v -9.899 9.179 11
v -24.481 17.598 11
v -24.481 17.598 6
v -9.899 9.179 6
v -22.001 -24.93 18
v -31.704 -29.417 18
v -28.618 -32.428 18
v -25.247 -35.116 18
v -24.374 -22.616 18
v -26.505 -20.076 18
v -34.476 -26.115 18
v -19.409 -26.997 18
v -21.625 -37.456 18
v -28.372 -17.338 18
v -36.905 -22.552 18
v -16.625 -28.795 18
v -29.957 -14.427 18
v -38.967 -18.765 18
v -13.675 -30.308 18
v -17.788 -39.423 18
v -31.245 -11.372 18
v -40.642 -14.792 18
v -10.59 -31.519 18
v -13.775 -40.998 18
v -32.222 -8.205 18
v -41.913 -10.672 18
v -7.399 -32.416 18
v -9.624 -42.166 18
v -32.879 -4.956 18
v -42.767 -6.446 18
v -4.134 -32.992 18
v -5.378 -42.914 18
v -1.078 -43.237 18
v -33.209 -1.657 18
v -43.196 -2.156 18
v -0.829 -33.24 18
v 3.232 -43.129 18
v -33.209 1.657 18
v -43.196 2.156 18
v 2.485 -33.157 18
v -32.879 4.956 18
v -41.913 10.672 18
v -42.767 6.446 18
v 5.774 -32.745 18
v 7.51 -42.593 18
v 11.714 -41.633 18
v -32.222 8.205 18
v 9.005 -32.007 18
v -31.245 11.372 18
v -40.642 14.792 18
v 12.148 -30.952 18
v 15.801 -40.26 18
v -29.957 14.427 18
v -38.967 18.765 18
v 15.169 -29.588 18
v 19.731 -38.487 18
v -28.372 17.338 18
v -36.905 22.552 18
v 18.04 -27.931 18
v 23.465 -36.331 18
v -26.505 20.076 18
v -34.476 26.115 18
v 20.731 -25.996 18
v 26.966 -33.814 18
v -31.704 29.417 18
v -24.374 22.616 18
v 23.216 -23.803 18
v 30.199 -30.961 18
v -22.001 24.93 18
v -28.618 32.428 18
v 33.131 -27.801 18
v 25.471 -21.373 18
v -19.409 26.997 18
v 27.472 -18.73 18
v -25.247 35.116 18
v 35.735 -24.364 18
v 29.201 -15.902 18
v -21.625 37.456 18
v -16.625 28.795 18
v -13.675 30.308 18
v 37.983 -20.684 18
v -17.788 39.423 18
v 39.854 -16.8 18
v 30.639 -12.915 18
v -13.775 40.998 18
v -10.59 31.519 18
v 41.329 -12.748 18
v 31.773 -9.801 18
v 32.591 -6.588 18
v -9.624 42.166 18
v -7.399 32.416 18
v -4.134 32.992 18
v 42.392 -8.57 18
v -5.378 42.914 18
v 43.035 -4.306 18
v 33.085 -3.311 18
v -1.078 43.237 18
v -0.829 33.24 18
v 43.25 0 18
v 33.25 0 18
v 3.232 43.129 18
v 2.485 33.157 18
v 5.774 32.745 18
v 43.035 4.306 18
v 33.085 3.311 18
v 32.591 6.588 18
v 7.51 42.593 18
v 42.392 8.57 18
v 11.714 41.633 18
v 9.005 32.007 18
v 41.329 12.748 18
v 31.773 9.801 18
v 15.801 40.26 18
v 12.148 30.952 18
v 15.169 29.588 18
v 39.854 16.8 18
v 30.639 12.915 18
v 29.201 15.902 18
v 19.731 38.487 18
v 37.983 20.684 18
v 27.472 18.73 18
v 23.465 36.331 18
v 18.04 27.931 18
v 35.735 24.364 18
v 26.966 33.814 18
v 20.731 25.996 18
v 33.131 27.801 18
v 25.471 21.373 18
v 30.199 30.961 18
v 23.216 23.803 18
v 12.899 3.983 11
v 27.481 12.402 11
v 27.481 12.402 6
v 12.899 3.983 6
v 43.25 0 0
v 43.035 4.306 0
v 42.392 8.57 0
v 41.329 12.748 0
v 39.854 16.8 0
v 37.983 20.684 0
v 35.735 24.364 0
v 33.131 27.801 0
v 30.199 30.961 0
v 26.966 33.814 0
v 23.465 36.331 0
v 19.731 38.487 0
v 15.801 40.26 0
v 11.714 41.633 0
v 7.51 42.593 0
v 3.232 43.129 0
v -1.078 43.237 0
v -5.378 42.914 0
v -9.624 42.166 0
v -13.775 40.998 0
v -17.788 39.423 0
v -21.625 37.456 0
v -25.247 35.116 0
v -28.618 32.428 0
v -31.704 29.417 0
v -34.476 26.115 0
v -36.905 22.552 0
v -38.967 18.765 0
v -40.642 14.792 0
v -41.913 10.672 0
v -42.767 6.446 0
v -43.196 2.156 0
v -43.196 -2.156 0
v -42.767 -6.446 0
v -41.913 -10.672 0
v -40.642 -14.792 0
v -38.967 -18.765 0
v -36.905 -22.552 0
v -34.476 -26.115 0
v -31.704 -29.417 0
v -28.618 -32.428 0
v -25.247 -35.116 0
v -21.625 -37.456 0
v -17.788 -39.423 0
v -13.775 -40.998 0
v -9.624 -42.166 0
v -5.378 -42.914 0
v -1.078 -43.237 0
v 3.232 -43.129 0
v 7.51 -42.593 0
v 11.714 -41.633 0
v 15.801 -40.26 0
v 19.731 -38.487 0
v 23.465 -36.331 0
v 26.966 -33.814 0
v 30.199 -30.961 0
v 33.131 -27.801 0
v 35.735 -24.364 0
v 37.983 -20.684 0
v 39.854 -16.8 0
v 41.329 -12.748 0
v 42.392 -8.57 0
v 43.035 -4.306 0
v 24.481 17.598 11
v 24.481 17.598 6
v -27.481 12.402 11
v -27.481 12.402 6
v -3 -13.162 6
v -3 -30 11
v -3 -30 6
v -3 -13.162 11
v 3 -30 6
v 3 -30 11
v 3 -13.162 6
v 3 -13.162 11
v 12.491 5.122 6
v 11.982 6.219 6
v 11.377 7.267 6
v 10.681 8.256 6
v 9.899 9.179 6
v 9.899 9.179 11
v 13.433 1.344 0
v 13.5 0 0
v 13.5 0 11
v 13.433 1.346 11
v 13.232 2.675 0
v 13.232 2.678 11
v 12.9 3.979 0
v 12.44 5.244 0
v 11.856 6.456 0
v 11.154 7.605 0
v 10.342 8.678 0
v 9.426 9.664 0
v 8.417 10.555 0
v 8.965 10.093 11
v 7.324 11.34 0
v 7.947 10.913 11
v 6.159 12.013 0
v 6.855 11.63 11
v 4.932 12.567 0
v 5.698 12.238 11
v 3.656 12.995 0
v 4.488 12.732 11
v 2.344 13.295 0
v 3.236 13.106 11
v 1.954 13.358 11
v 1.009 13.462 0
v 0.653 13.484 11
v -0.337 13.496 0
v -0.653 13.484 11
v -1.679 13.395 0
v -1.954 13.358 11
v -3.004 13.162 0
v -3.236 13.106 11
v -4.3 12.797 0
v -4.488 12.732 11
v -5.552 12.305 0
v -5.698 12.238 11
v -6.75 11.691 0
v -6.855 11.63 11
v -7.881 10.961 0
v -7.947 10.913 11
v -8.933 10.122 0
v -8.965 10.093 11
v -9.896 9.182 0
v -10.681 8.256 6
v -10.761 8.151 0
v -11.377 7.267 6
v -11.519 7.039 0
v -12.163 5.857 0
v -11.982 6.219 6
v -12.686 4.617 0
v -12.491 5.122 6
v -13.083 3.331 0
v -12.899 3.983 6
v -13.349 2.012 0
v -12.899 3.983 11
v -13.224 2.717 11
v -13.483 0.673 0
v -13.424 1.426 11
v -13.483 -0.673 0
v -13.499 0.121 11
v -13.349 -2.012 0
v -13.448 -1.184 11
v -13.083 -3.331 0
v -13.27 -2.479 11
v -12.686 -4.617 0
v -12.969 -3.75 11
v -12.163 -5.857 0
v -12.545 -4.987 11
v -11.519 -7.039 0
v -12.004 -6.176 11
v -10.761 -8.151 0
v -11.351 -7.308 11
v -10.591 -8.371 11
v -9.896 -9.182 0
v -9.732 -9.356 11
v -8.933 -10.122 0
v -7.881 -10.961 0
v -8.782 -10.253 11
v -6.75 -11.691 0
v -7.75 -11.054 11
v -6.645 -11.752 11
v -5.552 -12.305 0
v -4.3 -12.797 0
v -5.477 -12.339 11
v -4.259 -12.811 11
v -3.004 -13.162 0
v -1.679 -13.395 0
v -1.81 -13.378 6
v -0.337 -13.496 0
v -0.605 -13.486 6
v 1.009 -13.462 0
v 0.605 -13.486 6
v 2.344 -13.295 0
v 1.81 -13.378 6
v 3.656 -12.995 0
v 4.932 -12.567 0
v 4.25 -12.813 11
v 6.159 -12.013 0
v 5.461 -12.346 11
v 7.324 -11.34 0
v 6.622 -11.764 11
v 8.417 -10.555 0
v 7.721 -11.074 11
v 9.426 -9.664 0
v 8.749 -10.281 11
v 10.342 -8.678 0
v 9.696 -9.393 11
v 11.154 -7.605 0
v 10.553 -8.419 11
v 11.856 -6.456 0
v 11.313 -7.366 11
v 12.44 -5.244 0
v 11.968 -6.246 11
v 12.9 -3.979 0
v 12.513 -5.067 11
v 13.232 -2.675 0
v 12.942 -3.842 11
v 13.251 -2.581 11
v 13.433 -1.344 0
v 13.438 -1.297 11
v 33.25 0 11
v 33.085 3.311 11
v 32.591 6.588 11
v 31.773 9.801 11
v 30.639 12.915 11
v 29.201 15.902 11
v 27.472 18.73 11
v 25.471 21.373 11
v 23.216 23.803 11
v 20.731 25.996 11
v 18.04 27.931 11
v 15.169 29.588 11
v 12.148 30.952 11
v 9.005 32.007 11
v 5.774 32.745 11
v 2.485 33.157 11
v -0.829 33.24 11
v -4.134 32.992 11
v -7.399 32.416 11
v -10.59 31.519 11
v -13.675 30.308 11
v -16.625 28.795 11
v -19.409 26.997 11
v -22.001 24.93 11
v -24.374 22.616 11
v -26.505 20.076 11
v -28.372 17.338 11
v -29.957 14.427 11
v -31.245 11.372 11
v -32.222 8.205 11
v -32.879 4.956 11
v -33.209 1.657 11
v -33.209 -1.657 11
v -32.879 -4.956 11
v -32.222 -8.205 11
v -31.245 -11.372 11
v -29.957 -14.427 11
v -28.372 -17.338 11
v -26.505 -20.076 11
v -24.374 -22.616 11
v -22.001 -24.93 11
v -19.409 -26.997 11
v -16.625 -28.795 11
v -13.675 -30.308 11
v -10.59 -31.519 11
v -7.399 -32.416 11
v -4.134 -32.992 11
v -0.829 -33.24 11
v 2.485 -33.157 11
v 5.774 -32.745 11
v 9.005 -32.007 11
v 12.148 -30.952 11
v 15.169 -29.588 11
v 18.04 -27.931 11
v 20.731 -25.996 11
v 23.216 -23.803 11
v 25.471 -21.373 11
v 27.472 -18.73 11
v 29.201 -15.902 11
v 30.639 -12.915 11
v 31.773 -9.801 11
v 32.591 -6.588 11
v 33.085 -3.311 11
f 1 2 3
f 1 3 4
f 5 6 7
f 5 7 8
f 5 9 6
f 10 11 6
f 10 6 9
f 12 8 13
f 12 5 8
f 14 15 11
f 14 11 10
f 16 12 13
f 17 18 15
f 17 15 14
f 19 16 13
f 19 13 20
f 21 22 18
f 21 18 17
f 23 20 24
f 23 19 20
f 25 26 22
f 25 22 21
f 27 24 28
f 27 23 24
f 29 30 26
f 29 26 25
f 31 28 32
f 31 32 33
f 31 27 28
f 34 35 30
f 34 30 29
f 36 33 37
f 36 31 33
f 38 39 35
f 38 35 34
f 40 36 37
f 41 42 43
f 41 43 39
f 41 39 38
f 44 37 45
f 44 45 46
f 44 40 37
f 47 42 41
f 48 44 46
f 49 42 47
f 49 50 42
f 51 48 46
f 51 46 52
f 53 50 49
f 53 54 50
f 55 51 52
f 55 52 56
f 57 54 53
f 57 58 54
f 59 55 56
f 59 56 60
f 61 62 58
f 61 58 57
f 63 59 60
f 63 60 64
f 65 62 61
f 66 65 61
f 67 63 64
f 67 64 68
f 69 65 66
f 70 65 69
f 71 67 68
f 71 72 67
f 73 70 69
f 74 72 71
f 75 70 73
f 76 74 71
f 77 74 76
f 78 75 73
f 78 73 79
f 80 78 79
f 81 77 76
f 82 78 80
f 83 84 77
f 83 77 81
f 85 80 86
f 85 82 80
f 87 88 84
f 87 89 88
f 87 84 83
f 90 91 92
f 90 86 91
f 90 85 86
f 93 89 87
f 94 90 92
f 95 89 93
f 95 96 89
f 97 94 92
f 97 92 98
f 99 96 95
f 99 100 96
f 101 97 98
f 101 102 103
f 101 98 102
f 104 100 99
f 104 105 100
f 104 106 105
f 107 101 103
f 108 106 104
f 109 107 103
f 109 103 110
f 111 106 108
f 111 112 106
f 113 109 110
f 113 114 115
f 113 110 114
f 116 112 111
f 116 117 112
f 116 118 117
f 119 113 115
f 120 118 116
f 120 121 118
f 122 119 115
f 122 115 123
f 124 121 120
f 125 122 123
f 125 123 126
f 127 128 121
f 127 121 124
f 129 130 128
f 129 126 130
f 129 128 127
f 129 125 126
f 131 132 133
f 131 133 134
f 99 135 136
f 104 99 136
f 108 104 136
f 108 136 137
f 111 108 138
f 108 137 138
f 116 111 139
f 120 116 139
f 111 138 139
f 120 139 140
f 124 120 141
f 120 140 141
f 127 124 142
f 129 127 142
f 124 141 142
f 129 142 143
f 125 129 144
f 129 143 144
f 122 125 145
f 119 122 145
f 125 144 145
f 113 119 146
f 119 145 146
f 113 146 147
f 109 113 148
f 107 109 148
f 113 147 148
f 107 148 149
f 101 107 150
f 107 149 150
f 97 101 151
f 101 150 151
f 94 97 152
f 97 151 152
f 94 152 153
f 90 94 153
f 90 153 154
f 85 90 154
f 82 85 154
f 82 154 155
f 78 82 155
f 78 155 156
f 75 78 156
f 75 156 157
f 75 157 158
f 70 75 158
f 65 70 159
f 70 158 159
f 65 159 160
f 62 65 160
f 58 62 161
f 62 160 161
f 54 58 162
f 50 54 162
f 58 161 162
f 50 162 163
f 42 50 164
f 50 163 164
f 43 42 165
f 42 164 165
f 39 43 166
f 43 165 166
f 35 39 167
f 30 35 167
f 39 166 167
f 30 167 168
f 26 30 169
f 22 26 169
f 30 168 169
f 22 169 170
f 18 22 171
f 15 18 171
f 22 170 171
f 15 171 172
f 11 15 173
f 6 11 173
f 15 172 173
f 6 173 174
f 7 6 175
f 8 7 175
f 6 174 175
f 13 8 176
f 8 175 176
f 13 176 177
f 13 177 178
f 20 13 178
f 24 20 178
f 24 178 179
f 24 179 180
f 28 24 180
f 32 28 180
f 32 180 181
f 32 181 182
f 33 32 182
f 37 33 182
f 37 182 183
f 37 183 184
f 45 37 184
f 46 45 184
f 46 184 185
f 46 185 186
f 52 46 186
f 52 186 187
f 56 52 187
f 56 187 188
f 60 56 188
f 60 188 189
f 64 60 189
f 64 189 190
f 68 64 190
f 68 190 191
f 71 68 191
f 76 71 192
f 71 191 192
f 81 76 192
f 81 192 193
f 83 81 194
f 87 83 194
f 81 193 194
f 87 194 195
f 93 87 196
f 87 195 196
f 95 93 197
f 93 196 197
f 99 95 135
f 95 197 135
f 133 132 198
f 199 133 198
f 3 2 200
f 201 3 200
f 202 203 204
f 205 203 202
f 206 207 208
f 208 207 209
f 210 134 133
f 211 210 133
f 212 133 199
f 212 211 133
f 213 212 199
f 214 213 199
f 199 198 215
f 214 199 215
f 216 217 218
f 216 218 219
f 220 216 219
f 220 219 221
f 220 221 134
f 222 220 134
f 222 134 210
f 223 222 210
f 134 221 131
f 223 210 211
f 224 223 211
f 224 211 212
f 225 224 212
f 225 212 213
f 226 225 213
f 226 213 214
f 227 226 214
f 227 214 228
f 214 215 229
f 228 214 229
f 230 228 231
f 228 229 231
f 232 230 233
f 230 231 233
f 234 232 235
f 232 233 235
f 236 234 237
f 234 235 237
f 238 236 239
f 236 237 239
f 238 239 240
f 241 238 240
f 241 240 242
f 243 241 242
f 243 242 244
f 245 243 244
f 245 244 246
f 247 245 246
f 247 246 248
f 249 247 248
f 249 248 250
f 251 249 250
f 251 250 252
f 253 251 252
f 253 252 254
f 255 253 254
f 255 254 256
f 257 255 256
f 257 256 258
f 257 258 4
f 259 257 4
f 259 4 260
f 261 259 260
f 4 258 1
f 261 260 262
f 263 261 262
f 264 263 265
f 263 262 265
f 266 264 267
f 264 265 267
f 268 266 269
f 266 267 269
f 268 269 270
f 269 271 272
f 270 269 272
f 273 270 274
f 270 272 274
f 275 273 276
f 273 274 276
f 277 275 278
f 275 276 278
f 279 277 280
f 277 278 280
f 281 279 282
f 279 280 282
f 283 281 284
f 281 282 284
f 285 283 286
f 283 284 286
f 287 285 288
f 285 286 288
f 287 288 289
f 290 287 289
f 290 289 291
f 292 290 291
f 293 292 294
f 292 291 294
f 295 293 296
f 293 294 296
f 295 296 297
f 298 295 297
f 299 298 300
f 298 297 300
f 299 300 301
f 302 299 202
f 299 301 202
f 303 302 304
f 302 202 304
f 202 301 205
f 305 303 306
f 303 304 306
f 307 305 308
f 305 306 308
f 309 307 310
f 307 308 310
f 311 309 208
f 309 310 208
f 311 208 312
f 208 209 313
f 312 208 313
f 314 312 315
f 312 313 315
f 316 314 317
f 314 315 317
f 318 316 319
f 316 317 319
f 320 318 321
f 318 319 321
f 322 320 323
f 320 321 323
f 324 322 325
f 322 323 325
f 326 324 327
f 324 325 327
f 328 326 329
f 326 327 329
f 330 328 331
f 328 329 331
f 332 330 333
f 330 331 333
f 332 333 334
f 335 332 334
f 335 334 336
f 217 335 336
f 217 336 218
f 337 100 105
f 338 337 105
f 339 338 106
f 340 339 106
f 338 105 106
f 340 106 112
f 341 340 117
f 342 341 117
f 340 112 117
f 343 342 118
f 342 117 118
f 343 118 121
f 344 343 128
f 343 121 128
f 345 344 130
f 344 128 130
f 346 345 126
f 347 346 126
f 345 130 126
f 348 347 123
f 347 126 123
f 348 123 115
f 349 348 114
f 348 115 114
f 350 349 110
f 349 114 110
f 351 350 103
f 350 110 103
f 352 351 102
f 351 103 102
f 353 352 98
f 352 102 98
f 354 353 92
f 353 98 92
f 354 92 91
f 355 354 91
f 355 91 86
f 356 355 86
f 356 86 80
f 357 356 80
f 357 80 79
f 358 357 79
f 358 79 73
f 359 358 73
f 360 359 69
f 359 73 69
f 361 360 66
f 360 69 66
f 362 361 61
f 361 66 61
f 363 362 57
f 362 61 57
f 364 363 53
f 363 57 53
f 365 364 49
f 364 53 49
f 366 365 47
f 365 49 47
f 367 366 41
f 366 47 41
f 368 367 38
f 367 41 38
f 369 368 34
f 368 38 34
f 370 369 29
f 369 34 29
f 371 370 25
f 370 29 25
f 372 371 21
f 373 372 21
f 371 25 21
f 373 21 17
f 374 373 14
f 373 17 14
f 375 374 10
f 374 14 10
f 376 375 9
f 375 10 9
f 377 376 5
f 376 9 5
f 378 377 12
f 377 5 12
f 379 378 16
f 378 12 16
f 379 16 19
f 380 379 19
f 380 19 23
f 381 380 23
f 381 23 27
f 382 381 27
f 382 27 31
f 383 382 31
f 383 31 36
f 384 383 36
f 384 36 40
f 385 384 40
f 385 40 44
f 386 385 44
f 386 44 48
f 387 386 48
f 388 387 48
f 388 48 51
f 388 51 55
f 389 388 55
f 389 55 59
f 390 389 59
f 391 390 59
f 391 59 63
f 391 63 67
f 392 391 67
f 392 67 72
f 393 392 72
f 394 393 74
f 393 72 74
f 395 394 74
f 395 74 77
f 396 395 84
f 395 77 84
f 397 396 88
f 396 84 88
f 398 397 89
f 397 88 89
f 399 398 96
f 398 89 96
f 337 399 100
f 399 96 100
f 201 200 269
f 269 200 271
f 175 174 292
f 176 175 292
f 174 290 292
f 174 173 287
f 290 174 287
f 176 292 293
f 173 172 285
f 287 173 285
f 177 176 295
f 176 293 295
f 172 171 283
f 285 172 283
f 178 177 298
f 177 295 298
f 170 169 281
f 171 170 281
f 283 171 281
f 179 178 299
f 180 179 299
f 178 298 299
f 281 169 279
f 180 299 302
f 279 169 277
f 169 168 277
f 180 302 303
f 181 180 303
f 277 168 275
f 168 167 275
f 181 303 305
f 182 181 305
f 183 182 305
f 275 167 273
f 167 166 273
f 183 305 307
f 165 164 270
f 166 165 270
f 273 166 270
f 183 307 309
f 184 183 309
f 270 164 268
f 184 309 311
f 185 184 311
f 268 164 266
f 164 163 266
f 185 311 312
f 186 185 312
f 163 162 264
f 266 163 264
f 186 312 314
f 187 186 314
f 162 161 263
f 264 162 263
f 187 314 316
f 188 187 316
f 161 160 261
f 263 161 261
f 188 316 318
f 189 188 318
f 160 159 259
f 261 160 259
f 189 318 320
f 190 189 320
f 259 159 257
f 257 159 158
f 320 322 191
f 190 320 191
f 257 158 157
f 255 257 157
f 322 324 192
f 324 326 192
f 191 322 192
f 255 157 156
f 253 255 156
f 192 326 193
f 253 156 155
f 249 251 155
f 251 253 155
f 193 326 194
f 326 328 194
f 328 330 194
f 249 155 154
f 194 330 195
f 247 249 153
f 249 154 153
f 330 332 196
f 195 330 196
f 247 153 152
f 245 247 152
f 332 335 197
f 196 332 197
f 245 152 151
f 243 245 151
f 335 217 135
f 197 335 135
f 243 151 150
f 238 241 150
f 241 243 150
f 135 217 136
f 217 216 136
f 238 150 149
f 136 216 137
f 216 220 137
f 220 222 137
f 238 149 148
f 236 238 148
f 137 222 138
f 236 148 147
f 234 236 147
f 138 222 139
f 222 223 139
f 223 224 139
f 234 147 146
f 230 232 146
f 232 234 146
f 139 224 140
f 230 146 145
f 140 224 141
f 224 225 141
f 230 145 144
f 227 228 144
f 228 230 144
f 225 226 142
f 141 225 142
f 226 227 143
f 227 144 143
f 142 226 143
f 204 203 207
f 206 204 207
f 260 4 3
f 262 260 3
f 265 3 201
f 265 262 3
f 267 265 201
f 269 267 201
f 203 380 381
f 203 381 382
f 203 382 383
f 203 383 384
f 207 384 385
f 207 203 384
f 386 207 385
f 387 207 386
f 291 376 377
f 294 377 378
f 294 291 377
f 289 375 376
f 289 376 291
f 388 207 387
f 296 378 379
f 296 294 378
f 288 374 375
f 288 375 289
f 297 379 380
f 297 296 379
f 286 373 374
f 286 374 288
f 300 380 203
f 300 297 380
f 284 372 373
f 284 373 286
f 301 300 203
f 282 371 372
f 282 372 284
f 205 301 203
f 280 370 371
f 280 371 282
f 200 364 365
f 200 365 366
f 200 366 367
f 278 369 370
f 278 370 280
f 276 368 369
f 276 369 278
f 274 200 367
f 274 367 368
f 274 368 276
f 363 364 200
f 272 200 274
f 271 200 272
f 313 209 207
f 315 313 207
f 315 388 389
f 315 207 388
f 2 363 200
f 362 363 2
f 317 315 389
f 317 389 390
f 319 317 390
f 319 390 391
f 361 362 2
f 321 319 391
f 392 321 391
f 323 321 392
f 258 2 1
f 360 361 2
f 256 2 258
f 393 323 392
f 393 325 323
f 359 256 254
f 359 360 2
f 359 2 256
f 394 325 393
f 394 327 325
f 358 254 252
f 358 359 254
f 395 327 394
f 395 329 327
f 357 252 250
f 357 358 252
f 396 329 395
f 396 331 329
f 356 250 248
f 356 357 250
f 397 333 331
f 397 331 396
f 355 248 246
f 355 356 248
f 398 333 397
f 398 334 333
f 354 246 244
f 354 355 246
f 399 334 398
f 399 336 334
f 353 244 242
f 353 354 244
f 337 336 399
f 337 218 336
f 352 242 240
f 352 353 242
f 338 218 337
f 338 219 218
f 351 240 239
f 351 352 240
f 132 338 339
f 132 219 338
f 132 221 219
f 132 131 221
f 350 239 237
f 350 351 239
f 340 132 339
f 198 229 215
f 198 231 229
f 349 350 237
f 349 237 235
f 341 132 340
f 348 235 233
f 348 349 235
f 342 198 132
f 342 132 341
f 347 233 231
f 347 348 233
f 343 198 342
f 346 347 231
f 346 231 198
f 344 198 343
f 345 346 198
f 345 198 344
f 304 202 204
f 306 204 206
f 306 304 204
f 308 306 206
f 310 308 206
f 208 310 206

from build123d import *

# Parameters (mm, degrees)
SKETCH_R           = 43.25
PAD_DEPTH          = 18
SKETCH001_R        = 33.25
POCKET_DEPTH       = 7
SKETCH002_R        = 13.5
POCKET001_DEPTH    = 11.001
SKETCH003_W        = 6
SKETCH003_H        = 30
POCKET002_DEPTH    = 5
POLARPATTERN_COUNT = 3


with BuildPart() as part:
    # Sketch → Pad (new body)
    with BuildSketch(Plane.XY):
        Circle(SKETCH_R)
    extrude(amount=PAD_DEPTH)

    # Sketch001 (on Face3 of Pad) → Pocket (cut)
    with BuildSketch(Plane.XY.offset(18)):
        Circle(SKETCH001_R)
    extrude(amount=-POCKET_DEPTH, mode=Mode.SUBTRACT)

    # Sketch002 (on Face5 of Pocket) → Pocket001 (cut, through all)
    with BuildSketch(Plane.XY.offset(11)):
        Circle(SKETCH002_R)
    extrude(amount=-POCKET001_DEPTH, mode=Mode.SUBTRACT)

    # Sketch003 (on Face6 of Pocket001) → Pocket002 (cut)
    with BuildSketch(Plane.XY.offset(11)):
        with Locations((0, -15)):
            Rectangle(SKETCH003_W, SKETCH003_H)
    pocket002 = extrude(amount=-POCKET002_DEPTH, mode=Mode.SUBTRACT)

    # PolarPattern: Pocket002 ×3 about axis
    polarpattern_axis = Axis((0, 0, 11), (0, 0, 1))
    for i in range(1, POLARPATTERN_COUNT):
        add(pocket002.rotate(polarpattern_axis, i * 360 / POLARPATTERN_COUNT), mode=Mode.SUBTRACT)


solid = part.part
